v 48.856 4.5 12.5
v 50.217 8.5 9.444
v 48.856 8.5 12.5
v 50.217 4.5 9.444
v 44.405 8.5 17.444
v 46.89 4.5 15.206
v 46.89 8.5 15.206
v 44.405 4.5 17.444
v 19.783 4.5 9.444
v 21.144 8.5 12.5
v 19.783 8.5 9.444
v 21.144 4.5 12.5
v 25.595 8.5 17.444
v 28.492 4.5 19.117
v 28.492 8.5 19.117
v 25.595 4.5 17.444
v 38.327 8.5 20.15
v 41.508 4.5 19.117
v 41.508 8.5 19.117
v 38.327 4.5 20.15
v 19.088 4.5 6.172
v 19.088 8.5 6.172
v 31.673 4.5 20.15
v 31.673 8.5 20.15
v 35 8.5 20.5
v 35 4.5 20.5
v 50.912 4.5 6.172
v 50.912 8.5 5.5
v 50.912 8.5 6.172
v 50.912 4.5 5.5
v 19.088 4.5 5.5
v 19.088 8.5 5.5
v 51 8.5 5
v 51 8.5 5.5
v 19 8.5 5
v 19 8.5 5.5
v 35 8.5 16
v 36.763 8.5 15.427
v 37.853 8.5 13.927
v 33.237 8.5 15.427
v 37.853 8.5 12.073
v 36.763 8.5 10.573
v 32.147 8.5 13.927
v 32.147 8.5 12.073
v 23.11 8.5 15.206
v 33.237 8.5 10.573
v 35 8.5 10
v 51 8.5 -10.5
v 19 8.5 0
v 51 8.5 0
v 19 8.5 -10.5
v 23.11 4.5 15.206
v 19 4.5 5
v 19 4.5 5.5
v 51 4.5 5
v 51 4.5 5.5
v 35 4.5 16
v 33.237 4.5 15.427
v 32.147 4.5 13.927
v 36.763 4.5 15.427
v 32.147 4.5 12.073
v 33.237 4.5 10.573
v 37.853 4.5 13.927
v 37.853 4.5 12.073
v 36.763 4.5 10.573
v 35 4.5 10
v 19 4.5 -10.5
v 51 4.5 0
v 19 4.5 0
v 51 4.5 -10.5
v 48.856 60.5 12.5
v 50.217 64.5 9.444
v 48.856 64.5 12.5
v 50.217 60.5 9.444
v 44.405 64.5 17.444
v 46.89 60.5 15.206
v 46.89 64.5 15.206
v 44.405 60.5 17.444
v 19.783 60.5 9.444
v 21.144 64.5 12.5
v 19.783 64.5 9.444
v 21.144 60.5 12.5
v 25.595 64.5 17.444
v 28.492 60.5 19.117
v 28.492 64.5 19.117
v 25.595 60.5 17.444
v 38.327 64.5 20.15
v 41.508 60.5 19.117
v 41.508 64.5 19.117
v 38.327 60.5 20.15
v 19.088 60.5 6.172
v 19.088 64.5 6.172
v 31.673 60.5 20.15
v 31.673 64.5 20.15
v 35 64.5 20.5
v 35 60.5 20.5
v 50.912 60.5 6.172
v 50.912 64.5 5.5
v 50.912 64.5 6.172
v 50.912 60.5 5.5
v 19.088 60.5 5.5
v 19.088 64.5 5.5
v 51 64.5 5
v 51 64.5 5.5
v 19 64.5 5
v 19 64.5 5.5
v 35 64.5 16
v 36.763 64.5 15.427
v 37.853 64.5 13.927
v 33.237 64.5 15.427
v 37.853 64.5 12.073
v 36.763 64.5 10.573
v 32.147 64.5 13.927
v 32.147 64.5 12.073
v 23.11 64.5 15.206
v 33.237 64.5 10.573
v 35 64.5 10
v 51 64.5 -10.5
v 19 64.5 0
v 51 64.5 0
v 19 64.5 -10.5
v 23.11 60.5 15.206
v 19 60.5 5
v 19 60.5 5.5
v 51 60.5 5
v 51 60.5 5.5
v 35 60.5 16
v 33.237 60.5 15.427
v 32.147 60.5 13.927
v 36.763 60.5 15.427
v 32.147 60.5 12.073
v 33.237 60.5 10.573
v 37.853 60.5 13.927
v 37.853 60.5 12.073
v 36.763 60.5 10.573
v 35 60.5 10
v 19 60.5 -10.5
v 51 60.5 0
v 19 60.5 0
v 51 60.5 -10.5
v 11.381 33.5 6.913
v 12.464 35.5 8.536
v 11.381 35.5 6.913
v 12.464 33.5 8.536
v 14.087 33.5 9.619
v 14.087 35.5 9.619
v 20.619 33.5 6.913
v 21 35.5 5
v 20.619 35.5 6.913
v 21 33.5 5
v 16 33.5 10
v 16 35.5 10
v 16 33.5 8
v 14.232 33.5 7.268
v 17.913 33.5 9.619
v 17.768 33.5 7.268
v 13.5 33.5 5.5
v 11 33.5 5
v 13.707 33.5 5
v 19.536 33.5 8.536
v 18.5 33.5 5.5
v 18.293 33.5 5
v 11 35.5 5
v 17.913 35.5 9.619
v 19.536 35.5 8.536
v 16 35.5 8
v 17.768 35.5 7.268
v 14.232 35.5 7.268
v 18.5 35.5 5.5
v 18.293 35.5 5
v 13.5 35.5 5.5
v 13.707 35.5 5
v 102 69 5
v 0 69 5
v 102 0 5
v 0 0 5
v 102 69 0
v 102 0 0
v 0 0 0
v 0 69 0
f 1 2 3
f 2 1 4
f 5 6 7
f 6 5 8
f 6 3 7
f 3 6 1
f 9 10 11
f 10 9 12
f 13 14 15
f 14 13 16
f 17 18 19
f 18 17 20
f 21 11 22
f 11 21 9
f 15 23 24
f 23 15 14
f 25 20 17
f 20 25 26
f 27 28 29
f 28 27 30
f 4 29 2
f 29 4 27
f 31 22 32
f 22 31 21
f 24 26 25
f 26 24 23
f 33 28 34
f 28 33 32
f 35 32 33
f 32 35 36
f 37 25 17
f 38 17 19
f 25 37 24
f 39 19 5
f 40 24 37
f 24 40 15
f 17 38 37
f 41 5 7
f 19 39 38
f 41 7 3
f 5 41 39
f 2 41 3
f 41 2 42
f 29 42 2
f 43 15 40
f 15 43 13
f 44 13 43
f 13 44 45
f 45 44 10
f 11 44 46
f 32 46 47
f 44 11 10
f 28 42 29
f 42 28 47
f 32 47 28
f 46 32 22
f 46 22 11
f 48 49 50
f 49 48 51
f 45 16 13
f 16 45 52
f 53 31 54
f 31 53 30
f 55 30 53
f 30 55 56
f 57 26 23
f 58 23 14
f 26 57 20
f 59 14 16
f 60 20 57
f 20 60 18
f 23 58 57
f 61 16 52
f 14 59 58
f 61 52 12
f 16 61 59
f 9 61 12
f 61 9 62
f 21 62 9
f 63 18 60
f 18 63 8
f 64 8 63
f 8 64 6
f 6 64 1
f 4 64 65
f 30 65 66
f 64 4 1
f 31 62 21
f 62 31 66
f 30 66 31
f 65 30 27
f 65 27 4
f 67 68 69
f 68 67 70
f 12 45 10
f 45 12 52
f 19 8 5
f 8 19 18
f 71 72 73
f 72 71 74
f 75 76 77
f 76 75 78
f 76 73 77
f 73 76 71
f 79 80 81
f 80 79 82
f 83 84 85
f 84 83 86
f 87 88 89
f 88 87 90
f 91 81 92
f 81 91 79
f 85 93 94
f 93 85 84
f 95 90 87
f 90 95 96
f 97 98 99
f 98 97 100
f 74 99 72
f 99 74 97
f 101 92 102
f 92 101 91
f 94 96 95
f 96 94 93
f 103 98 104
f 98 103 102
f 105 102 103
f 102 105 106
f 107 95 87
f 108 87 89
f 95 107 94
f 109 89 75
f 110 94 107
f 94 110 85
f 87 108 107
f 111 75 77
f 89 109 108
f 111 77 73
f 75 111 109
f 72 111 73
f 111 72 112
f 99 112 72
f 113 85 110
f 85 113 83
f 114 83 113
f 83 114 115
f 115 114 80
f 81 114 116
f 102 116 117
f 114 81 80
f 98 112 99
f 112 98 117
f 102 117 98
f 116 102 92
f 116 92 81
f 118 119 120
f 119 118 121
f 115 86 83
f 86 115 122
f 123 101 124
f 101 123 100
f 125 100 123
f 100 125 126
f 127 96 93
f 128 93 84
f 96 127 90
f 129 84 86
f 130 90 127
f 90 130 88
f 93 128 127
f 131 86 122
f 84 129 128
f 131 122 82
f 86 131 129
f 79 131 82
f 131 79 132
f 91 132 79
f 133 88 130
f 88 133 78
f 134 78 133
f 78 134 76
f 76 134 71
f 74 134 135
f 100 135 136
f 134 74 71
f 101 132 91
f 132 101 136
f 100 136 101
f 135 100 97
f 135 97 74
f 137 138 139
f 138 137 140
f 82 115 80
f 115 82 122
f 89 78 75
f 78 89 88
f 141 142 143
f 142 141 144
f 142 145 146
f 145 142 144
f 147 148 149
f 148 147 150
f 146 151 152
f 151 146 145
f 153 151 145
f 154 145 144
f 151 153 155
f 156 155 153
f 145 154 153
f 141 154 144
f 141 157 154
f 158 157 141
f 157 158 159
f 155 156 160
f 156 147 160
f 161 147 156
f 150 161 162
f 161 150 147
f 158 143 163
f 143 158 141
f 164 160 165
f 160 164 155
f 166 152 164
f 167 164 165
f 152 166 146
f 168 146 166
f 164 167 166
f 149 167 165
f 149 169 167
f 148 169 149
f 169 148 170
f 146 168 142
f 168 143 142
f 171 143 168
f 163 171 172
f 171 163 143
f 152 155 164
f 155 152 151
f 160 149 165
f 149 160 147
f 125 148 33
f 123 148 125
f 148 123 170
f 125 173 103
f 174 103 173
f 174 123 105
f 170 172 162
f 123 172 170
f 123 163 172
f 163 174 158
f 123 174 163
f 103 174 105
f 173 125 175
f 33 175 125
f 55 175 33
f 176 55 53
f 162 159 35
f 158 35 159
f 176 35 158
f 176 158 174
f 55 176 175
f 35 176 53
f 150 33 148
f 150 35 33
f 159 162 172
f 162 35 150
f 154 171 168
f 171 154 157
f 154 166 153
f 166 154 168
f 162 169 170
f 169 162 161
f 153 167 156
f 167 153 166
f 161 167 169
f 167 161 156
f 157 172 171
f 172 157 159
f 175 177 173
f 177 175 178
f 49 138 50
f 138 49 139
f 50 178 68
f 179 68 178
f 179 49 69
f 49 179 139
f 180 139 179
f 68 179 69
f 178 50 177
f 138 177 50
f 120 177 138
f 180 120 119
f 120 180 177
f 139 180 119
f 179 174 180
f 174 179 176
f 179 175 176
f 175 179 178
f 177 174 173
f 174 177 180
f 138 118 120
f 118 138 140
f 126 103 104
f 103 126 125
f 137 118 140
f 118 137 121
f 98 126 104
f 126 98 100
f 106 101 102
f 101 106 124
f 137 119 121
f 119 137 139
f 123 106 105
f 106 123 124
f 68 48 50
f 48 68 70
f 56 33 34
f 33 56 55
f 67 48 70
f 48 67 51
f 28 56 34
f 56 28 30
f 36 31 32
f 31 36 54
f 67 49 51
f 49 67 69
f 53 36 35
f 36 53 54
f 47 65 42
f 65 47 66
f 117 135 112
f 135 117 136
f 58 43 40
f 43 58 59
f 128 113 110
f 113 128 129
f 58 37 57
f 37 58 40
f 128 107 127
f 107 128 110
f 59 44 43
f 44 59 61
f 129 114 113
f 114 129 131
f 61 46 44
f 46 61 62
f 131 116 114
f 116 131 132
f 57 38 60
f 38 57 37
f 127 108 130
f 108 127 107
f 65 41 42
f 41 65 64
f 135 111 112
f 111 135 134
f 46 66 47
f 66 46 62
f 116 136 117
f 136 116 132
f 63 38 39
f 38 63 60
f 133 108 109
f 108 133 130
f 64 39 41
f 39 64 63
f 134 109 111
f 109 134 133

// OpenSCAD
base_plate_width = 100;
base_plate_length = 70;
base_plate_height = 3;
base_plate_dimensions = [base_plate_width,base_plate_length,base_plate_height];

up_plate_width = 5;
up_plate_length = 70;
up_plate_height = 30;
up_plate_dimensions = [up_plate_width,up_plate_length,up_plate_height];

wall_plate_width= 100;
wall_plate_length = 5;
wall_plate_height = 50;
wall_plate_dimensions = [wall_plate_width,wall_plate_length,wall_plate_height];


module halfcylinder(he,rd) {
	difference(){
		cylinder (h=he,r=rd);
		translate([0,-rd-0.1,-0.1]) cube([rd+0.1,rd*2+0.2,he+0.2]);
	} // df
} // mod


cylinder_radius = 15;
cylinder_height = 5;






base2_plate_width = 102;
base2_plate_length = 69;
base2_plate_height = 5;
base2_plate_dimensions = [base2_plate_width,base2_plate_length,base2_plate_height];


cylinder2_radius = 16;
cylinder2_height = 4;

/*

translate([0,70,55])
rotate([180,0,0])
difference(){
	union(){
		
		translate([0,0,50])
		cube(base2_plate_dimensions);
		
		
		rotate([270,270,0])
		translate([50,35,base2_plate_length-4])
		halfcylinder(cylinder2_height,cylinder2_radius);

		
		rotate([270,270,0])
		translate([50,35,0])
		halfcylinder(cylinder2_height,cylinder2_radius);
		
		translate([16, base2_plate_length/2+1, 50])		
		difference(){	
			
			rotate([90,270,0])
			//color("red")
			halfcylinder(2,5);
			
			translate([0,0,-0.5])
			rotate([90,90,0])
			//color("black")
			cylinder(d = 5, h=20, center = true);	
			}
	}	
	
	translate([35,-10,cylinder2_radius*2+10])
	//color("black")
	rotate([270,90,0])
	cylinder(h=120, r=3);
}

*/
// das sind die eigenlrichen einstellungen
//translate([0,01,-16.5])
//rotate([180,0,0])


rotate([180,0,0])
//translate([0,0,-42.5])
translate([0,-69,-42.5])
difference(){
	union(){
		
		translate([0,0,37.5])
		cube(base2_plate_dimensions);
		
		translate([19,4.5,37])
		//color("white")
		cube([cylinder2_radius*2, cylinder2_height, 16]);
		
		rotate([270,270,0])
		translate([38,35,base2_plate_length-8.5])
		halfcylinder(cylinder2_height,cylinder2_radius);

		translate([19,base2_plate_length-8.5,37])
		//color("black")
		cube([cylinder2_radius*2, cylinder2_height, 16]);
		
		rotate([270,270,0])
		translate([38,35,4.5])
		halfcylinder(cylinder2_height,cylinder2_radius);
		
		translate([16, base2_plate_length/2+1, 37.5])		
		difference(){	
			
			rotate([90,270,0])
			//color("black")
			halfcylinder(2,5);
			
			translate([0,0,-0.5])
			rotate([90,90,0])
			cylinder(d = 5, h=20, center = true);	
			}
	}	
	
	translate([35,-10,cylinder2_radius*2-2.5])
	color("transparent")
	rotate([270,90,0])
	cylinder(h=120, r=3);
}
